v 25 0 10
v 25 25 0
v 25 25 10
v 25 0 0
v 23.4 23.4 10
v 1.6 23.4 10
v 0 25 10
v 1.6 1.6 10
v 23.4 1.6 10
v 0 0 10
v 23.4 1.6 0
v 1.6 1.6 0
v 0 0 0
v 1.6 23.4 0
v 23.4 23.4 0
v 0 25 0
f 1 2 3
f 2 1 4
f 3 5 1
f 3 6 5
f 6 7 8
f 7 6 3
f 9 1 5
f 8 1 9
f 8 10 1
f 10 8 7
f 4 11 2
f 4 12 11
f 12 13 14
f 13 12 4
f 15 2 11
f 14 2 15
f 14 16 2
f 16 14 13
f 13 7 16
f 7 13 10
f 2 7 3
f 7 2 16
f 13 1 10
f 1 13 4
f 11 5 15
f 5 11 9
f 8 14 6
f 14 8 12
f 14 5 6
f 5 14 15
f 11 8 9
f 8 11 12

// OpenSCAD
// klipper-auto-eject - parts for a first test
// https://github.com/ahmedbebars/klipper-auto-eject
//
//   hollow_cube        a square ring with thin walls, like a cookie cutter.
//                      Print two or three, eject them, watch.
//   blade_gauge        a 1.5 mm strip to set the blade height: with the nozzle
//                      tip on the bed, the blade rests on the strip.
//   calibration_block  a low, solid block for AUTO_EJECT_CALIBRATE (Voron Tap
//                      and other probes that touch with the nozzle). Print it
//                      anywhere but the middle of the bed and leave it stuck
//                      there. It must stay lower than the fan duct, which sits
//                      only a few millimetres above the nozzle tip.
//                      Print it SOLID (100 % infill): the probe presses on it
//                      dozens of times. Measure once the bed is below 40 C.
//
// Copyright (C) 2026 Ahmed Bebars
// This file may be distributed under the terms of the GNU GPLv3 license.

/* [Part] */
part = "hollow_cube"; // [hollow_cube, calibration_block, blade_gauge]

/* [Hollow cube] */
cube_size = 25;
cube_height = 10;
wall = 1.6;

/* [Blade gauge] */
gauge_thickness = 1.5;

/* [Calibration block] */
block_size = 20;
block_height = 3.5;

if (part == "hollow_cube") {
    difference() {
        cube([cube_size, cube_size, cube_height]);
        translate([wall, wall, -1])
            cube([cube_size - 2 * wall, cube_size - 2 * wall, cube_height + 2]);
    }
} else if (part == "blade_gauge") {
    // a strip to slide under the blade while the nozzle sits on the bed
    difference() {
        cube([60, 20, gauge_thickness]);
        translate([30, 10, gauge_thickness - 0.6])
            linear_extrude(1)
                text(str(gauge_thickness, " mm"), size = 6, halign = "center", valign = "center");
    }
} else {
    cube([block_size, block_size, block_height]);
}
